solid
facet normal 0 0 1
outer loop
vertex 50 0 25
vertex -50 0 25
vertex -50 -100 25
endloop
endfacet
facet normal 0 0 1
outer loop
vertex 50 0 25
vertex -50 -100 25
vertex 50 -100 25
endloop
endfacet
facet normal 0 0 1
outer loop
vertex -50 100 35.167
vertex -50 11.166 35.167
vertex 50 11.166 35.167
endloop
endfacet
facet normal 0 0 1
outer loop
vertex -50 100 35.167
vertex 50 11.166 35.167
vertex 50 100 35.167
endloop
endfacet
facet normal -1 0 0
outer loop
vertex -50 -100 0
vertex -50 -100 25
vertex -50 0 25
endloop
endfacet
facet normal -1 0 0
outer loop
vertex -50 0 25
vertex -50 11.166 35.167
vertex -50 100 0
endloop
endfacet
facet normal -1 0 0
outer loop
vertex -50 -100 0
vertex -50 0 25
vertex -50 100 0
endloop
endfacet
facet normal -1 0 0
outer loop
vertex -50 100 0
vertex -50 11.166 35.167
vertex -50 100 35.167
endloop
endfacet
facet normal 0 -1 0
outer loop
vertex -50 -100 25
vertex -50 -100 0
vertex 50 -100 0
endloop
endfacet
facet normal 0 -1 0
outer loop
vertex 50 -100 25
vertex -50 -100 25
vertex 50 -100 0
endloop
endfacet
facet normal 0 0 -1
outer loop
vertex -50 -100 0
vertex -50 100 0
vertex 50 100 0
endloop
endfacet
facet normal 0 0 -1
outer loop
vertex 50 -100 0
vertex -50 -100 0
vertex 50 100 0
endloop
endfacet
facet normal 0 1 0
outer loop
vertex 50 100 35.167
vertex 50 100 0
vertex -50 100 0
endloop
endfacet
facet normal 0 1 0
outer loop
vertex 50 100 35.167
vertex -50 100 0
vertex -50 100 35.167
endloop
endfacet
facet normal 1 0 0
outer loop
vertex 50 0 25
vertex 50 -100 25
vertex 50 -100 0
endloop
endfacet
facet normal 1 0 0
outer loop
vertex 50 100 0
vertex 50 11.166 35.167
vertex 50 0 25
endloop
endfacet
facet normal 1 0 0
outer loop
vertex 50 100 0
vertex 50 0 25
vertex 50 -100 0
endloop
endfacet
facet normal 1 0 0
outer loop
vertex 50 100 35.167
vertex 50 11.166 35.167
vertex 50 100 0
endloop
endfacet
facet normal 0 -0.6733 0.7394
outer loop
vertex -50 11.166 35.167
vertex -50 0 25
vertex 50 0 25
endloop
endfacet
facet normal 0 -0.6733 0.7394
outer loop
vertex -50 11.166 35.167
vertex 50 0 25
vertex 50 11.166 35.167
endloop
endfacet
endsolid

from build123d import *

# Parameters (mm, degrees)
F0_W     = 100
F0_H     = 200
F1_DEPTH = 25
F2_W     = 100
F2_H     = 10.1669974625
F3_DEPTH = 100
F5_DEPTH = 200


with BuildPart() as f1:
    # F0 (on Top) → F1 (new body)
    with BuildSketch(Plane.XY):
        Rectangle(F0_W, F0_H)
    extrude(amount=F1_DEPTH)

    # F2 (on face) → F3 (join)
    with BuildSketch(Plane.YZ.offset(50)):
        with Locations((50, 30.0834987313)):
            Rectangle(F2_W, F2_H)
    extrude(amount=-F3_DEPTH)

    # F4 (on face) → F5 (cut)
    with BuildSketch(Plane.YZ.offset(50)):
        Polygon((0, 35.1669974625), (0, 25), (11.165715754, 35.1669974625), align=None)
    extrude(amount=-F5_DEPTH, mode=Mode.SUBTRACT)


solid = f1.part
